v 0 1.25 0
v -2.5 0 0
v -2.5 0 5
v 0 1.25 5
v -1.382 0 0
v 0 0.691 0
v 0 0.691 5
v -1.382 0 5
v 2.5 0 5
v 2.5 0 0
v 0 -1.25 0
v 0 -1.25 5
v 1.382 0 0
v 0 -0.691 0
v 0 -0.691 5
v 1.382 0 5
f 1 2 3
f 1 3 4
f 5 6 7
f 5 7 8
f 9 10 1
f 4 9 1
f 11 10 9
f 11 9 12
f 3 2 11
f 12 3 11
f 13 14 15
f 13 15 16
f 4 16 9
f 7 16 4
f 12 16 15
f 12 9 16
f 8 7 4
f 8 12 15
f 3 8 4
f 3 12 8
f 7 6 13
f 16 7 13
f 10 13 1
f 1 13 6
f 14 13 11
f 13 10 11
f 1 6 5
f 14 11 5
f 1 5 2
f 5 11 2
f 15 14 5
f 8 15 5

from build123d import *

# Parameters (mm, degrees)
F2_DEPTH = 5


# Not quite as in the source:
# - a pattern or mirror of a feature is missing from the dataset's text; its kind, count and spacing are read off the source's solid
# - a feature names something its author has since deleted; it is built from what else it names


with BuildPart() as f2:
    # F1 (on Top) → F2 (new body)
    with BuildSketch(Plane.XY):
        Polygon((0, 1.25), (0, 0.6909830056), (1.3819660113, 0), (2.5, 0), align=None)
    extrude(amount=F2_DEPTH)

    # F2_copies: F2 across plane


with BuildPart() as f2_1:
    add(f2.part)
    add(f2.part.mirror(Plane(origin=(0, 0, 0), x_dir=(0, 0, -1), z_dir=(0, -1, 0))))

    # F2_copies1: F2 across plane


with BuildPart() as f2_2:
    add(f2_1.part)
    add(f2_1.part.mirror(Plane(origin=(0, 0, 0), x_dir=(0, 0, -1), z_dir=(-1, 0, 0))))


solid = f2_2.part
